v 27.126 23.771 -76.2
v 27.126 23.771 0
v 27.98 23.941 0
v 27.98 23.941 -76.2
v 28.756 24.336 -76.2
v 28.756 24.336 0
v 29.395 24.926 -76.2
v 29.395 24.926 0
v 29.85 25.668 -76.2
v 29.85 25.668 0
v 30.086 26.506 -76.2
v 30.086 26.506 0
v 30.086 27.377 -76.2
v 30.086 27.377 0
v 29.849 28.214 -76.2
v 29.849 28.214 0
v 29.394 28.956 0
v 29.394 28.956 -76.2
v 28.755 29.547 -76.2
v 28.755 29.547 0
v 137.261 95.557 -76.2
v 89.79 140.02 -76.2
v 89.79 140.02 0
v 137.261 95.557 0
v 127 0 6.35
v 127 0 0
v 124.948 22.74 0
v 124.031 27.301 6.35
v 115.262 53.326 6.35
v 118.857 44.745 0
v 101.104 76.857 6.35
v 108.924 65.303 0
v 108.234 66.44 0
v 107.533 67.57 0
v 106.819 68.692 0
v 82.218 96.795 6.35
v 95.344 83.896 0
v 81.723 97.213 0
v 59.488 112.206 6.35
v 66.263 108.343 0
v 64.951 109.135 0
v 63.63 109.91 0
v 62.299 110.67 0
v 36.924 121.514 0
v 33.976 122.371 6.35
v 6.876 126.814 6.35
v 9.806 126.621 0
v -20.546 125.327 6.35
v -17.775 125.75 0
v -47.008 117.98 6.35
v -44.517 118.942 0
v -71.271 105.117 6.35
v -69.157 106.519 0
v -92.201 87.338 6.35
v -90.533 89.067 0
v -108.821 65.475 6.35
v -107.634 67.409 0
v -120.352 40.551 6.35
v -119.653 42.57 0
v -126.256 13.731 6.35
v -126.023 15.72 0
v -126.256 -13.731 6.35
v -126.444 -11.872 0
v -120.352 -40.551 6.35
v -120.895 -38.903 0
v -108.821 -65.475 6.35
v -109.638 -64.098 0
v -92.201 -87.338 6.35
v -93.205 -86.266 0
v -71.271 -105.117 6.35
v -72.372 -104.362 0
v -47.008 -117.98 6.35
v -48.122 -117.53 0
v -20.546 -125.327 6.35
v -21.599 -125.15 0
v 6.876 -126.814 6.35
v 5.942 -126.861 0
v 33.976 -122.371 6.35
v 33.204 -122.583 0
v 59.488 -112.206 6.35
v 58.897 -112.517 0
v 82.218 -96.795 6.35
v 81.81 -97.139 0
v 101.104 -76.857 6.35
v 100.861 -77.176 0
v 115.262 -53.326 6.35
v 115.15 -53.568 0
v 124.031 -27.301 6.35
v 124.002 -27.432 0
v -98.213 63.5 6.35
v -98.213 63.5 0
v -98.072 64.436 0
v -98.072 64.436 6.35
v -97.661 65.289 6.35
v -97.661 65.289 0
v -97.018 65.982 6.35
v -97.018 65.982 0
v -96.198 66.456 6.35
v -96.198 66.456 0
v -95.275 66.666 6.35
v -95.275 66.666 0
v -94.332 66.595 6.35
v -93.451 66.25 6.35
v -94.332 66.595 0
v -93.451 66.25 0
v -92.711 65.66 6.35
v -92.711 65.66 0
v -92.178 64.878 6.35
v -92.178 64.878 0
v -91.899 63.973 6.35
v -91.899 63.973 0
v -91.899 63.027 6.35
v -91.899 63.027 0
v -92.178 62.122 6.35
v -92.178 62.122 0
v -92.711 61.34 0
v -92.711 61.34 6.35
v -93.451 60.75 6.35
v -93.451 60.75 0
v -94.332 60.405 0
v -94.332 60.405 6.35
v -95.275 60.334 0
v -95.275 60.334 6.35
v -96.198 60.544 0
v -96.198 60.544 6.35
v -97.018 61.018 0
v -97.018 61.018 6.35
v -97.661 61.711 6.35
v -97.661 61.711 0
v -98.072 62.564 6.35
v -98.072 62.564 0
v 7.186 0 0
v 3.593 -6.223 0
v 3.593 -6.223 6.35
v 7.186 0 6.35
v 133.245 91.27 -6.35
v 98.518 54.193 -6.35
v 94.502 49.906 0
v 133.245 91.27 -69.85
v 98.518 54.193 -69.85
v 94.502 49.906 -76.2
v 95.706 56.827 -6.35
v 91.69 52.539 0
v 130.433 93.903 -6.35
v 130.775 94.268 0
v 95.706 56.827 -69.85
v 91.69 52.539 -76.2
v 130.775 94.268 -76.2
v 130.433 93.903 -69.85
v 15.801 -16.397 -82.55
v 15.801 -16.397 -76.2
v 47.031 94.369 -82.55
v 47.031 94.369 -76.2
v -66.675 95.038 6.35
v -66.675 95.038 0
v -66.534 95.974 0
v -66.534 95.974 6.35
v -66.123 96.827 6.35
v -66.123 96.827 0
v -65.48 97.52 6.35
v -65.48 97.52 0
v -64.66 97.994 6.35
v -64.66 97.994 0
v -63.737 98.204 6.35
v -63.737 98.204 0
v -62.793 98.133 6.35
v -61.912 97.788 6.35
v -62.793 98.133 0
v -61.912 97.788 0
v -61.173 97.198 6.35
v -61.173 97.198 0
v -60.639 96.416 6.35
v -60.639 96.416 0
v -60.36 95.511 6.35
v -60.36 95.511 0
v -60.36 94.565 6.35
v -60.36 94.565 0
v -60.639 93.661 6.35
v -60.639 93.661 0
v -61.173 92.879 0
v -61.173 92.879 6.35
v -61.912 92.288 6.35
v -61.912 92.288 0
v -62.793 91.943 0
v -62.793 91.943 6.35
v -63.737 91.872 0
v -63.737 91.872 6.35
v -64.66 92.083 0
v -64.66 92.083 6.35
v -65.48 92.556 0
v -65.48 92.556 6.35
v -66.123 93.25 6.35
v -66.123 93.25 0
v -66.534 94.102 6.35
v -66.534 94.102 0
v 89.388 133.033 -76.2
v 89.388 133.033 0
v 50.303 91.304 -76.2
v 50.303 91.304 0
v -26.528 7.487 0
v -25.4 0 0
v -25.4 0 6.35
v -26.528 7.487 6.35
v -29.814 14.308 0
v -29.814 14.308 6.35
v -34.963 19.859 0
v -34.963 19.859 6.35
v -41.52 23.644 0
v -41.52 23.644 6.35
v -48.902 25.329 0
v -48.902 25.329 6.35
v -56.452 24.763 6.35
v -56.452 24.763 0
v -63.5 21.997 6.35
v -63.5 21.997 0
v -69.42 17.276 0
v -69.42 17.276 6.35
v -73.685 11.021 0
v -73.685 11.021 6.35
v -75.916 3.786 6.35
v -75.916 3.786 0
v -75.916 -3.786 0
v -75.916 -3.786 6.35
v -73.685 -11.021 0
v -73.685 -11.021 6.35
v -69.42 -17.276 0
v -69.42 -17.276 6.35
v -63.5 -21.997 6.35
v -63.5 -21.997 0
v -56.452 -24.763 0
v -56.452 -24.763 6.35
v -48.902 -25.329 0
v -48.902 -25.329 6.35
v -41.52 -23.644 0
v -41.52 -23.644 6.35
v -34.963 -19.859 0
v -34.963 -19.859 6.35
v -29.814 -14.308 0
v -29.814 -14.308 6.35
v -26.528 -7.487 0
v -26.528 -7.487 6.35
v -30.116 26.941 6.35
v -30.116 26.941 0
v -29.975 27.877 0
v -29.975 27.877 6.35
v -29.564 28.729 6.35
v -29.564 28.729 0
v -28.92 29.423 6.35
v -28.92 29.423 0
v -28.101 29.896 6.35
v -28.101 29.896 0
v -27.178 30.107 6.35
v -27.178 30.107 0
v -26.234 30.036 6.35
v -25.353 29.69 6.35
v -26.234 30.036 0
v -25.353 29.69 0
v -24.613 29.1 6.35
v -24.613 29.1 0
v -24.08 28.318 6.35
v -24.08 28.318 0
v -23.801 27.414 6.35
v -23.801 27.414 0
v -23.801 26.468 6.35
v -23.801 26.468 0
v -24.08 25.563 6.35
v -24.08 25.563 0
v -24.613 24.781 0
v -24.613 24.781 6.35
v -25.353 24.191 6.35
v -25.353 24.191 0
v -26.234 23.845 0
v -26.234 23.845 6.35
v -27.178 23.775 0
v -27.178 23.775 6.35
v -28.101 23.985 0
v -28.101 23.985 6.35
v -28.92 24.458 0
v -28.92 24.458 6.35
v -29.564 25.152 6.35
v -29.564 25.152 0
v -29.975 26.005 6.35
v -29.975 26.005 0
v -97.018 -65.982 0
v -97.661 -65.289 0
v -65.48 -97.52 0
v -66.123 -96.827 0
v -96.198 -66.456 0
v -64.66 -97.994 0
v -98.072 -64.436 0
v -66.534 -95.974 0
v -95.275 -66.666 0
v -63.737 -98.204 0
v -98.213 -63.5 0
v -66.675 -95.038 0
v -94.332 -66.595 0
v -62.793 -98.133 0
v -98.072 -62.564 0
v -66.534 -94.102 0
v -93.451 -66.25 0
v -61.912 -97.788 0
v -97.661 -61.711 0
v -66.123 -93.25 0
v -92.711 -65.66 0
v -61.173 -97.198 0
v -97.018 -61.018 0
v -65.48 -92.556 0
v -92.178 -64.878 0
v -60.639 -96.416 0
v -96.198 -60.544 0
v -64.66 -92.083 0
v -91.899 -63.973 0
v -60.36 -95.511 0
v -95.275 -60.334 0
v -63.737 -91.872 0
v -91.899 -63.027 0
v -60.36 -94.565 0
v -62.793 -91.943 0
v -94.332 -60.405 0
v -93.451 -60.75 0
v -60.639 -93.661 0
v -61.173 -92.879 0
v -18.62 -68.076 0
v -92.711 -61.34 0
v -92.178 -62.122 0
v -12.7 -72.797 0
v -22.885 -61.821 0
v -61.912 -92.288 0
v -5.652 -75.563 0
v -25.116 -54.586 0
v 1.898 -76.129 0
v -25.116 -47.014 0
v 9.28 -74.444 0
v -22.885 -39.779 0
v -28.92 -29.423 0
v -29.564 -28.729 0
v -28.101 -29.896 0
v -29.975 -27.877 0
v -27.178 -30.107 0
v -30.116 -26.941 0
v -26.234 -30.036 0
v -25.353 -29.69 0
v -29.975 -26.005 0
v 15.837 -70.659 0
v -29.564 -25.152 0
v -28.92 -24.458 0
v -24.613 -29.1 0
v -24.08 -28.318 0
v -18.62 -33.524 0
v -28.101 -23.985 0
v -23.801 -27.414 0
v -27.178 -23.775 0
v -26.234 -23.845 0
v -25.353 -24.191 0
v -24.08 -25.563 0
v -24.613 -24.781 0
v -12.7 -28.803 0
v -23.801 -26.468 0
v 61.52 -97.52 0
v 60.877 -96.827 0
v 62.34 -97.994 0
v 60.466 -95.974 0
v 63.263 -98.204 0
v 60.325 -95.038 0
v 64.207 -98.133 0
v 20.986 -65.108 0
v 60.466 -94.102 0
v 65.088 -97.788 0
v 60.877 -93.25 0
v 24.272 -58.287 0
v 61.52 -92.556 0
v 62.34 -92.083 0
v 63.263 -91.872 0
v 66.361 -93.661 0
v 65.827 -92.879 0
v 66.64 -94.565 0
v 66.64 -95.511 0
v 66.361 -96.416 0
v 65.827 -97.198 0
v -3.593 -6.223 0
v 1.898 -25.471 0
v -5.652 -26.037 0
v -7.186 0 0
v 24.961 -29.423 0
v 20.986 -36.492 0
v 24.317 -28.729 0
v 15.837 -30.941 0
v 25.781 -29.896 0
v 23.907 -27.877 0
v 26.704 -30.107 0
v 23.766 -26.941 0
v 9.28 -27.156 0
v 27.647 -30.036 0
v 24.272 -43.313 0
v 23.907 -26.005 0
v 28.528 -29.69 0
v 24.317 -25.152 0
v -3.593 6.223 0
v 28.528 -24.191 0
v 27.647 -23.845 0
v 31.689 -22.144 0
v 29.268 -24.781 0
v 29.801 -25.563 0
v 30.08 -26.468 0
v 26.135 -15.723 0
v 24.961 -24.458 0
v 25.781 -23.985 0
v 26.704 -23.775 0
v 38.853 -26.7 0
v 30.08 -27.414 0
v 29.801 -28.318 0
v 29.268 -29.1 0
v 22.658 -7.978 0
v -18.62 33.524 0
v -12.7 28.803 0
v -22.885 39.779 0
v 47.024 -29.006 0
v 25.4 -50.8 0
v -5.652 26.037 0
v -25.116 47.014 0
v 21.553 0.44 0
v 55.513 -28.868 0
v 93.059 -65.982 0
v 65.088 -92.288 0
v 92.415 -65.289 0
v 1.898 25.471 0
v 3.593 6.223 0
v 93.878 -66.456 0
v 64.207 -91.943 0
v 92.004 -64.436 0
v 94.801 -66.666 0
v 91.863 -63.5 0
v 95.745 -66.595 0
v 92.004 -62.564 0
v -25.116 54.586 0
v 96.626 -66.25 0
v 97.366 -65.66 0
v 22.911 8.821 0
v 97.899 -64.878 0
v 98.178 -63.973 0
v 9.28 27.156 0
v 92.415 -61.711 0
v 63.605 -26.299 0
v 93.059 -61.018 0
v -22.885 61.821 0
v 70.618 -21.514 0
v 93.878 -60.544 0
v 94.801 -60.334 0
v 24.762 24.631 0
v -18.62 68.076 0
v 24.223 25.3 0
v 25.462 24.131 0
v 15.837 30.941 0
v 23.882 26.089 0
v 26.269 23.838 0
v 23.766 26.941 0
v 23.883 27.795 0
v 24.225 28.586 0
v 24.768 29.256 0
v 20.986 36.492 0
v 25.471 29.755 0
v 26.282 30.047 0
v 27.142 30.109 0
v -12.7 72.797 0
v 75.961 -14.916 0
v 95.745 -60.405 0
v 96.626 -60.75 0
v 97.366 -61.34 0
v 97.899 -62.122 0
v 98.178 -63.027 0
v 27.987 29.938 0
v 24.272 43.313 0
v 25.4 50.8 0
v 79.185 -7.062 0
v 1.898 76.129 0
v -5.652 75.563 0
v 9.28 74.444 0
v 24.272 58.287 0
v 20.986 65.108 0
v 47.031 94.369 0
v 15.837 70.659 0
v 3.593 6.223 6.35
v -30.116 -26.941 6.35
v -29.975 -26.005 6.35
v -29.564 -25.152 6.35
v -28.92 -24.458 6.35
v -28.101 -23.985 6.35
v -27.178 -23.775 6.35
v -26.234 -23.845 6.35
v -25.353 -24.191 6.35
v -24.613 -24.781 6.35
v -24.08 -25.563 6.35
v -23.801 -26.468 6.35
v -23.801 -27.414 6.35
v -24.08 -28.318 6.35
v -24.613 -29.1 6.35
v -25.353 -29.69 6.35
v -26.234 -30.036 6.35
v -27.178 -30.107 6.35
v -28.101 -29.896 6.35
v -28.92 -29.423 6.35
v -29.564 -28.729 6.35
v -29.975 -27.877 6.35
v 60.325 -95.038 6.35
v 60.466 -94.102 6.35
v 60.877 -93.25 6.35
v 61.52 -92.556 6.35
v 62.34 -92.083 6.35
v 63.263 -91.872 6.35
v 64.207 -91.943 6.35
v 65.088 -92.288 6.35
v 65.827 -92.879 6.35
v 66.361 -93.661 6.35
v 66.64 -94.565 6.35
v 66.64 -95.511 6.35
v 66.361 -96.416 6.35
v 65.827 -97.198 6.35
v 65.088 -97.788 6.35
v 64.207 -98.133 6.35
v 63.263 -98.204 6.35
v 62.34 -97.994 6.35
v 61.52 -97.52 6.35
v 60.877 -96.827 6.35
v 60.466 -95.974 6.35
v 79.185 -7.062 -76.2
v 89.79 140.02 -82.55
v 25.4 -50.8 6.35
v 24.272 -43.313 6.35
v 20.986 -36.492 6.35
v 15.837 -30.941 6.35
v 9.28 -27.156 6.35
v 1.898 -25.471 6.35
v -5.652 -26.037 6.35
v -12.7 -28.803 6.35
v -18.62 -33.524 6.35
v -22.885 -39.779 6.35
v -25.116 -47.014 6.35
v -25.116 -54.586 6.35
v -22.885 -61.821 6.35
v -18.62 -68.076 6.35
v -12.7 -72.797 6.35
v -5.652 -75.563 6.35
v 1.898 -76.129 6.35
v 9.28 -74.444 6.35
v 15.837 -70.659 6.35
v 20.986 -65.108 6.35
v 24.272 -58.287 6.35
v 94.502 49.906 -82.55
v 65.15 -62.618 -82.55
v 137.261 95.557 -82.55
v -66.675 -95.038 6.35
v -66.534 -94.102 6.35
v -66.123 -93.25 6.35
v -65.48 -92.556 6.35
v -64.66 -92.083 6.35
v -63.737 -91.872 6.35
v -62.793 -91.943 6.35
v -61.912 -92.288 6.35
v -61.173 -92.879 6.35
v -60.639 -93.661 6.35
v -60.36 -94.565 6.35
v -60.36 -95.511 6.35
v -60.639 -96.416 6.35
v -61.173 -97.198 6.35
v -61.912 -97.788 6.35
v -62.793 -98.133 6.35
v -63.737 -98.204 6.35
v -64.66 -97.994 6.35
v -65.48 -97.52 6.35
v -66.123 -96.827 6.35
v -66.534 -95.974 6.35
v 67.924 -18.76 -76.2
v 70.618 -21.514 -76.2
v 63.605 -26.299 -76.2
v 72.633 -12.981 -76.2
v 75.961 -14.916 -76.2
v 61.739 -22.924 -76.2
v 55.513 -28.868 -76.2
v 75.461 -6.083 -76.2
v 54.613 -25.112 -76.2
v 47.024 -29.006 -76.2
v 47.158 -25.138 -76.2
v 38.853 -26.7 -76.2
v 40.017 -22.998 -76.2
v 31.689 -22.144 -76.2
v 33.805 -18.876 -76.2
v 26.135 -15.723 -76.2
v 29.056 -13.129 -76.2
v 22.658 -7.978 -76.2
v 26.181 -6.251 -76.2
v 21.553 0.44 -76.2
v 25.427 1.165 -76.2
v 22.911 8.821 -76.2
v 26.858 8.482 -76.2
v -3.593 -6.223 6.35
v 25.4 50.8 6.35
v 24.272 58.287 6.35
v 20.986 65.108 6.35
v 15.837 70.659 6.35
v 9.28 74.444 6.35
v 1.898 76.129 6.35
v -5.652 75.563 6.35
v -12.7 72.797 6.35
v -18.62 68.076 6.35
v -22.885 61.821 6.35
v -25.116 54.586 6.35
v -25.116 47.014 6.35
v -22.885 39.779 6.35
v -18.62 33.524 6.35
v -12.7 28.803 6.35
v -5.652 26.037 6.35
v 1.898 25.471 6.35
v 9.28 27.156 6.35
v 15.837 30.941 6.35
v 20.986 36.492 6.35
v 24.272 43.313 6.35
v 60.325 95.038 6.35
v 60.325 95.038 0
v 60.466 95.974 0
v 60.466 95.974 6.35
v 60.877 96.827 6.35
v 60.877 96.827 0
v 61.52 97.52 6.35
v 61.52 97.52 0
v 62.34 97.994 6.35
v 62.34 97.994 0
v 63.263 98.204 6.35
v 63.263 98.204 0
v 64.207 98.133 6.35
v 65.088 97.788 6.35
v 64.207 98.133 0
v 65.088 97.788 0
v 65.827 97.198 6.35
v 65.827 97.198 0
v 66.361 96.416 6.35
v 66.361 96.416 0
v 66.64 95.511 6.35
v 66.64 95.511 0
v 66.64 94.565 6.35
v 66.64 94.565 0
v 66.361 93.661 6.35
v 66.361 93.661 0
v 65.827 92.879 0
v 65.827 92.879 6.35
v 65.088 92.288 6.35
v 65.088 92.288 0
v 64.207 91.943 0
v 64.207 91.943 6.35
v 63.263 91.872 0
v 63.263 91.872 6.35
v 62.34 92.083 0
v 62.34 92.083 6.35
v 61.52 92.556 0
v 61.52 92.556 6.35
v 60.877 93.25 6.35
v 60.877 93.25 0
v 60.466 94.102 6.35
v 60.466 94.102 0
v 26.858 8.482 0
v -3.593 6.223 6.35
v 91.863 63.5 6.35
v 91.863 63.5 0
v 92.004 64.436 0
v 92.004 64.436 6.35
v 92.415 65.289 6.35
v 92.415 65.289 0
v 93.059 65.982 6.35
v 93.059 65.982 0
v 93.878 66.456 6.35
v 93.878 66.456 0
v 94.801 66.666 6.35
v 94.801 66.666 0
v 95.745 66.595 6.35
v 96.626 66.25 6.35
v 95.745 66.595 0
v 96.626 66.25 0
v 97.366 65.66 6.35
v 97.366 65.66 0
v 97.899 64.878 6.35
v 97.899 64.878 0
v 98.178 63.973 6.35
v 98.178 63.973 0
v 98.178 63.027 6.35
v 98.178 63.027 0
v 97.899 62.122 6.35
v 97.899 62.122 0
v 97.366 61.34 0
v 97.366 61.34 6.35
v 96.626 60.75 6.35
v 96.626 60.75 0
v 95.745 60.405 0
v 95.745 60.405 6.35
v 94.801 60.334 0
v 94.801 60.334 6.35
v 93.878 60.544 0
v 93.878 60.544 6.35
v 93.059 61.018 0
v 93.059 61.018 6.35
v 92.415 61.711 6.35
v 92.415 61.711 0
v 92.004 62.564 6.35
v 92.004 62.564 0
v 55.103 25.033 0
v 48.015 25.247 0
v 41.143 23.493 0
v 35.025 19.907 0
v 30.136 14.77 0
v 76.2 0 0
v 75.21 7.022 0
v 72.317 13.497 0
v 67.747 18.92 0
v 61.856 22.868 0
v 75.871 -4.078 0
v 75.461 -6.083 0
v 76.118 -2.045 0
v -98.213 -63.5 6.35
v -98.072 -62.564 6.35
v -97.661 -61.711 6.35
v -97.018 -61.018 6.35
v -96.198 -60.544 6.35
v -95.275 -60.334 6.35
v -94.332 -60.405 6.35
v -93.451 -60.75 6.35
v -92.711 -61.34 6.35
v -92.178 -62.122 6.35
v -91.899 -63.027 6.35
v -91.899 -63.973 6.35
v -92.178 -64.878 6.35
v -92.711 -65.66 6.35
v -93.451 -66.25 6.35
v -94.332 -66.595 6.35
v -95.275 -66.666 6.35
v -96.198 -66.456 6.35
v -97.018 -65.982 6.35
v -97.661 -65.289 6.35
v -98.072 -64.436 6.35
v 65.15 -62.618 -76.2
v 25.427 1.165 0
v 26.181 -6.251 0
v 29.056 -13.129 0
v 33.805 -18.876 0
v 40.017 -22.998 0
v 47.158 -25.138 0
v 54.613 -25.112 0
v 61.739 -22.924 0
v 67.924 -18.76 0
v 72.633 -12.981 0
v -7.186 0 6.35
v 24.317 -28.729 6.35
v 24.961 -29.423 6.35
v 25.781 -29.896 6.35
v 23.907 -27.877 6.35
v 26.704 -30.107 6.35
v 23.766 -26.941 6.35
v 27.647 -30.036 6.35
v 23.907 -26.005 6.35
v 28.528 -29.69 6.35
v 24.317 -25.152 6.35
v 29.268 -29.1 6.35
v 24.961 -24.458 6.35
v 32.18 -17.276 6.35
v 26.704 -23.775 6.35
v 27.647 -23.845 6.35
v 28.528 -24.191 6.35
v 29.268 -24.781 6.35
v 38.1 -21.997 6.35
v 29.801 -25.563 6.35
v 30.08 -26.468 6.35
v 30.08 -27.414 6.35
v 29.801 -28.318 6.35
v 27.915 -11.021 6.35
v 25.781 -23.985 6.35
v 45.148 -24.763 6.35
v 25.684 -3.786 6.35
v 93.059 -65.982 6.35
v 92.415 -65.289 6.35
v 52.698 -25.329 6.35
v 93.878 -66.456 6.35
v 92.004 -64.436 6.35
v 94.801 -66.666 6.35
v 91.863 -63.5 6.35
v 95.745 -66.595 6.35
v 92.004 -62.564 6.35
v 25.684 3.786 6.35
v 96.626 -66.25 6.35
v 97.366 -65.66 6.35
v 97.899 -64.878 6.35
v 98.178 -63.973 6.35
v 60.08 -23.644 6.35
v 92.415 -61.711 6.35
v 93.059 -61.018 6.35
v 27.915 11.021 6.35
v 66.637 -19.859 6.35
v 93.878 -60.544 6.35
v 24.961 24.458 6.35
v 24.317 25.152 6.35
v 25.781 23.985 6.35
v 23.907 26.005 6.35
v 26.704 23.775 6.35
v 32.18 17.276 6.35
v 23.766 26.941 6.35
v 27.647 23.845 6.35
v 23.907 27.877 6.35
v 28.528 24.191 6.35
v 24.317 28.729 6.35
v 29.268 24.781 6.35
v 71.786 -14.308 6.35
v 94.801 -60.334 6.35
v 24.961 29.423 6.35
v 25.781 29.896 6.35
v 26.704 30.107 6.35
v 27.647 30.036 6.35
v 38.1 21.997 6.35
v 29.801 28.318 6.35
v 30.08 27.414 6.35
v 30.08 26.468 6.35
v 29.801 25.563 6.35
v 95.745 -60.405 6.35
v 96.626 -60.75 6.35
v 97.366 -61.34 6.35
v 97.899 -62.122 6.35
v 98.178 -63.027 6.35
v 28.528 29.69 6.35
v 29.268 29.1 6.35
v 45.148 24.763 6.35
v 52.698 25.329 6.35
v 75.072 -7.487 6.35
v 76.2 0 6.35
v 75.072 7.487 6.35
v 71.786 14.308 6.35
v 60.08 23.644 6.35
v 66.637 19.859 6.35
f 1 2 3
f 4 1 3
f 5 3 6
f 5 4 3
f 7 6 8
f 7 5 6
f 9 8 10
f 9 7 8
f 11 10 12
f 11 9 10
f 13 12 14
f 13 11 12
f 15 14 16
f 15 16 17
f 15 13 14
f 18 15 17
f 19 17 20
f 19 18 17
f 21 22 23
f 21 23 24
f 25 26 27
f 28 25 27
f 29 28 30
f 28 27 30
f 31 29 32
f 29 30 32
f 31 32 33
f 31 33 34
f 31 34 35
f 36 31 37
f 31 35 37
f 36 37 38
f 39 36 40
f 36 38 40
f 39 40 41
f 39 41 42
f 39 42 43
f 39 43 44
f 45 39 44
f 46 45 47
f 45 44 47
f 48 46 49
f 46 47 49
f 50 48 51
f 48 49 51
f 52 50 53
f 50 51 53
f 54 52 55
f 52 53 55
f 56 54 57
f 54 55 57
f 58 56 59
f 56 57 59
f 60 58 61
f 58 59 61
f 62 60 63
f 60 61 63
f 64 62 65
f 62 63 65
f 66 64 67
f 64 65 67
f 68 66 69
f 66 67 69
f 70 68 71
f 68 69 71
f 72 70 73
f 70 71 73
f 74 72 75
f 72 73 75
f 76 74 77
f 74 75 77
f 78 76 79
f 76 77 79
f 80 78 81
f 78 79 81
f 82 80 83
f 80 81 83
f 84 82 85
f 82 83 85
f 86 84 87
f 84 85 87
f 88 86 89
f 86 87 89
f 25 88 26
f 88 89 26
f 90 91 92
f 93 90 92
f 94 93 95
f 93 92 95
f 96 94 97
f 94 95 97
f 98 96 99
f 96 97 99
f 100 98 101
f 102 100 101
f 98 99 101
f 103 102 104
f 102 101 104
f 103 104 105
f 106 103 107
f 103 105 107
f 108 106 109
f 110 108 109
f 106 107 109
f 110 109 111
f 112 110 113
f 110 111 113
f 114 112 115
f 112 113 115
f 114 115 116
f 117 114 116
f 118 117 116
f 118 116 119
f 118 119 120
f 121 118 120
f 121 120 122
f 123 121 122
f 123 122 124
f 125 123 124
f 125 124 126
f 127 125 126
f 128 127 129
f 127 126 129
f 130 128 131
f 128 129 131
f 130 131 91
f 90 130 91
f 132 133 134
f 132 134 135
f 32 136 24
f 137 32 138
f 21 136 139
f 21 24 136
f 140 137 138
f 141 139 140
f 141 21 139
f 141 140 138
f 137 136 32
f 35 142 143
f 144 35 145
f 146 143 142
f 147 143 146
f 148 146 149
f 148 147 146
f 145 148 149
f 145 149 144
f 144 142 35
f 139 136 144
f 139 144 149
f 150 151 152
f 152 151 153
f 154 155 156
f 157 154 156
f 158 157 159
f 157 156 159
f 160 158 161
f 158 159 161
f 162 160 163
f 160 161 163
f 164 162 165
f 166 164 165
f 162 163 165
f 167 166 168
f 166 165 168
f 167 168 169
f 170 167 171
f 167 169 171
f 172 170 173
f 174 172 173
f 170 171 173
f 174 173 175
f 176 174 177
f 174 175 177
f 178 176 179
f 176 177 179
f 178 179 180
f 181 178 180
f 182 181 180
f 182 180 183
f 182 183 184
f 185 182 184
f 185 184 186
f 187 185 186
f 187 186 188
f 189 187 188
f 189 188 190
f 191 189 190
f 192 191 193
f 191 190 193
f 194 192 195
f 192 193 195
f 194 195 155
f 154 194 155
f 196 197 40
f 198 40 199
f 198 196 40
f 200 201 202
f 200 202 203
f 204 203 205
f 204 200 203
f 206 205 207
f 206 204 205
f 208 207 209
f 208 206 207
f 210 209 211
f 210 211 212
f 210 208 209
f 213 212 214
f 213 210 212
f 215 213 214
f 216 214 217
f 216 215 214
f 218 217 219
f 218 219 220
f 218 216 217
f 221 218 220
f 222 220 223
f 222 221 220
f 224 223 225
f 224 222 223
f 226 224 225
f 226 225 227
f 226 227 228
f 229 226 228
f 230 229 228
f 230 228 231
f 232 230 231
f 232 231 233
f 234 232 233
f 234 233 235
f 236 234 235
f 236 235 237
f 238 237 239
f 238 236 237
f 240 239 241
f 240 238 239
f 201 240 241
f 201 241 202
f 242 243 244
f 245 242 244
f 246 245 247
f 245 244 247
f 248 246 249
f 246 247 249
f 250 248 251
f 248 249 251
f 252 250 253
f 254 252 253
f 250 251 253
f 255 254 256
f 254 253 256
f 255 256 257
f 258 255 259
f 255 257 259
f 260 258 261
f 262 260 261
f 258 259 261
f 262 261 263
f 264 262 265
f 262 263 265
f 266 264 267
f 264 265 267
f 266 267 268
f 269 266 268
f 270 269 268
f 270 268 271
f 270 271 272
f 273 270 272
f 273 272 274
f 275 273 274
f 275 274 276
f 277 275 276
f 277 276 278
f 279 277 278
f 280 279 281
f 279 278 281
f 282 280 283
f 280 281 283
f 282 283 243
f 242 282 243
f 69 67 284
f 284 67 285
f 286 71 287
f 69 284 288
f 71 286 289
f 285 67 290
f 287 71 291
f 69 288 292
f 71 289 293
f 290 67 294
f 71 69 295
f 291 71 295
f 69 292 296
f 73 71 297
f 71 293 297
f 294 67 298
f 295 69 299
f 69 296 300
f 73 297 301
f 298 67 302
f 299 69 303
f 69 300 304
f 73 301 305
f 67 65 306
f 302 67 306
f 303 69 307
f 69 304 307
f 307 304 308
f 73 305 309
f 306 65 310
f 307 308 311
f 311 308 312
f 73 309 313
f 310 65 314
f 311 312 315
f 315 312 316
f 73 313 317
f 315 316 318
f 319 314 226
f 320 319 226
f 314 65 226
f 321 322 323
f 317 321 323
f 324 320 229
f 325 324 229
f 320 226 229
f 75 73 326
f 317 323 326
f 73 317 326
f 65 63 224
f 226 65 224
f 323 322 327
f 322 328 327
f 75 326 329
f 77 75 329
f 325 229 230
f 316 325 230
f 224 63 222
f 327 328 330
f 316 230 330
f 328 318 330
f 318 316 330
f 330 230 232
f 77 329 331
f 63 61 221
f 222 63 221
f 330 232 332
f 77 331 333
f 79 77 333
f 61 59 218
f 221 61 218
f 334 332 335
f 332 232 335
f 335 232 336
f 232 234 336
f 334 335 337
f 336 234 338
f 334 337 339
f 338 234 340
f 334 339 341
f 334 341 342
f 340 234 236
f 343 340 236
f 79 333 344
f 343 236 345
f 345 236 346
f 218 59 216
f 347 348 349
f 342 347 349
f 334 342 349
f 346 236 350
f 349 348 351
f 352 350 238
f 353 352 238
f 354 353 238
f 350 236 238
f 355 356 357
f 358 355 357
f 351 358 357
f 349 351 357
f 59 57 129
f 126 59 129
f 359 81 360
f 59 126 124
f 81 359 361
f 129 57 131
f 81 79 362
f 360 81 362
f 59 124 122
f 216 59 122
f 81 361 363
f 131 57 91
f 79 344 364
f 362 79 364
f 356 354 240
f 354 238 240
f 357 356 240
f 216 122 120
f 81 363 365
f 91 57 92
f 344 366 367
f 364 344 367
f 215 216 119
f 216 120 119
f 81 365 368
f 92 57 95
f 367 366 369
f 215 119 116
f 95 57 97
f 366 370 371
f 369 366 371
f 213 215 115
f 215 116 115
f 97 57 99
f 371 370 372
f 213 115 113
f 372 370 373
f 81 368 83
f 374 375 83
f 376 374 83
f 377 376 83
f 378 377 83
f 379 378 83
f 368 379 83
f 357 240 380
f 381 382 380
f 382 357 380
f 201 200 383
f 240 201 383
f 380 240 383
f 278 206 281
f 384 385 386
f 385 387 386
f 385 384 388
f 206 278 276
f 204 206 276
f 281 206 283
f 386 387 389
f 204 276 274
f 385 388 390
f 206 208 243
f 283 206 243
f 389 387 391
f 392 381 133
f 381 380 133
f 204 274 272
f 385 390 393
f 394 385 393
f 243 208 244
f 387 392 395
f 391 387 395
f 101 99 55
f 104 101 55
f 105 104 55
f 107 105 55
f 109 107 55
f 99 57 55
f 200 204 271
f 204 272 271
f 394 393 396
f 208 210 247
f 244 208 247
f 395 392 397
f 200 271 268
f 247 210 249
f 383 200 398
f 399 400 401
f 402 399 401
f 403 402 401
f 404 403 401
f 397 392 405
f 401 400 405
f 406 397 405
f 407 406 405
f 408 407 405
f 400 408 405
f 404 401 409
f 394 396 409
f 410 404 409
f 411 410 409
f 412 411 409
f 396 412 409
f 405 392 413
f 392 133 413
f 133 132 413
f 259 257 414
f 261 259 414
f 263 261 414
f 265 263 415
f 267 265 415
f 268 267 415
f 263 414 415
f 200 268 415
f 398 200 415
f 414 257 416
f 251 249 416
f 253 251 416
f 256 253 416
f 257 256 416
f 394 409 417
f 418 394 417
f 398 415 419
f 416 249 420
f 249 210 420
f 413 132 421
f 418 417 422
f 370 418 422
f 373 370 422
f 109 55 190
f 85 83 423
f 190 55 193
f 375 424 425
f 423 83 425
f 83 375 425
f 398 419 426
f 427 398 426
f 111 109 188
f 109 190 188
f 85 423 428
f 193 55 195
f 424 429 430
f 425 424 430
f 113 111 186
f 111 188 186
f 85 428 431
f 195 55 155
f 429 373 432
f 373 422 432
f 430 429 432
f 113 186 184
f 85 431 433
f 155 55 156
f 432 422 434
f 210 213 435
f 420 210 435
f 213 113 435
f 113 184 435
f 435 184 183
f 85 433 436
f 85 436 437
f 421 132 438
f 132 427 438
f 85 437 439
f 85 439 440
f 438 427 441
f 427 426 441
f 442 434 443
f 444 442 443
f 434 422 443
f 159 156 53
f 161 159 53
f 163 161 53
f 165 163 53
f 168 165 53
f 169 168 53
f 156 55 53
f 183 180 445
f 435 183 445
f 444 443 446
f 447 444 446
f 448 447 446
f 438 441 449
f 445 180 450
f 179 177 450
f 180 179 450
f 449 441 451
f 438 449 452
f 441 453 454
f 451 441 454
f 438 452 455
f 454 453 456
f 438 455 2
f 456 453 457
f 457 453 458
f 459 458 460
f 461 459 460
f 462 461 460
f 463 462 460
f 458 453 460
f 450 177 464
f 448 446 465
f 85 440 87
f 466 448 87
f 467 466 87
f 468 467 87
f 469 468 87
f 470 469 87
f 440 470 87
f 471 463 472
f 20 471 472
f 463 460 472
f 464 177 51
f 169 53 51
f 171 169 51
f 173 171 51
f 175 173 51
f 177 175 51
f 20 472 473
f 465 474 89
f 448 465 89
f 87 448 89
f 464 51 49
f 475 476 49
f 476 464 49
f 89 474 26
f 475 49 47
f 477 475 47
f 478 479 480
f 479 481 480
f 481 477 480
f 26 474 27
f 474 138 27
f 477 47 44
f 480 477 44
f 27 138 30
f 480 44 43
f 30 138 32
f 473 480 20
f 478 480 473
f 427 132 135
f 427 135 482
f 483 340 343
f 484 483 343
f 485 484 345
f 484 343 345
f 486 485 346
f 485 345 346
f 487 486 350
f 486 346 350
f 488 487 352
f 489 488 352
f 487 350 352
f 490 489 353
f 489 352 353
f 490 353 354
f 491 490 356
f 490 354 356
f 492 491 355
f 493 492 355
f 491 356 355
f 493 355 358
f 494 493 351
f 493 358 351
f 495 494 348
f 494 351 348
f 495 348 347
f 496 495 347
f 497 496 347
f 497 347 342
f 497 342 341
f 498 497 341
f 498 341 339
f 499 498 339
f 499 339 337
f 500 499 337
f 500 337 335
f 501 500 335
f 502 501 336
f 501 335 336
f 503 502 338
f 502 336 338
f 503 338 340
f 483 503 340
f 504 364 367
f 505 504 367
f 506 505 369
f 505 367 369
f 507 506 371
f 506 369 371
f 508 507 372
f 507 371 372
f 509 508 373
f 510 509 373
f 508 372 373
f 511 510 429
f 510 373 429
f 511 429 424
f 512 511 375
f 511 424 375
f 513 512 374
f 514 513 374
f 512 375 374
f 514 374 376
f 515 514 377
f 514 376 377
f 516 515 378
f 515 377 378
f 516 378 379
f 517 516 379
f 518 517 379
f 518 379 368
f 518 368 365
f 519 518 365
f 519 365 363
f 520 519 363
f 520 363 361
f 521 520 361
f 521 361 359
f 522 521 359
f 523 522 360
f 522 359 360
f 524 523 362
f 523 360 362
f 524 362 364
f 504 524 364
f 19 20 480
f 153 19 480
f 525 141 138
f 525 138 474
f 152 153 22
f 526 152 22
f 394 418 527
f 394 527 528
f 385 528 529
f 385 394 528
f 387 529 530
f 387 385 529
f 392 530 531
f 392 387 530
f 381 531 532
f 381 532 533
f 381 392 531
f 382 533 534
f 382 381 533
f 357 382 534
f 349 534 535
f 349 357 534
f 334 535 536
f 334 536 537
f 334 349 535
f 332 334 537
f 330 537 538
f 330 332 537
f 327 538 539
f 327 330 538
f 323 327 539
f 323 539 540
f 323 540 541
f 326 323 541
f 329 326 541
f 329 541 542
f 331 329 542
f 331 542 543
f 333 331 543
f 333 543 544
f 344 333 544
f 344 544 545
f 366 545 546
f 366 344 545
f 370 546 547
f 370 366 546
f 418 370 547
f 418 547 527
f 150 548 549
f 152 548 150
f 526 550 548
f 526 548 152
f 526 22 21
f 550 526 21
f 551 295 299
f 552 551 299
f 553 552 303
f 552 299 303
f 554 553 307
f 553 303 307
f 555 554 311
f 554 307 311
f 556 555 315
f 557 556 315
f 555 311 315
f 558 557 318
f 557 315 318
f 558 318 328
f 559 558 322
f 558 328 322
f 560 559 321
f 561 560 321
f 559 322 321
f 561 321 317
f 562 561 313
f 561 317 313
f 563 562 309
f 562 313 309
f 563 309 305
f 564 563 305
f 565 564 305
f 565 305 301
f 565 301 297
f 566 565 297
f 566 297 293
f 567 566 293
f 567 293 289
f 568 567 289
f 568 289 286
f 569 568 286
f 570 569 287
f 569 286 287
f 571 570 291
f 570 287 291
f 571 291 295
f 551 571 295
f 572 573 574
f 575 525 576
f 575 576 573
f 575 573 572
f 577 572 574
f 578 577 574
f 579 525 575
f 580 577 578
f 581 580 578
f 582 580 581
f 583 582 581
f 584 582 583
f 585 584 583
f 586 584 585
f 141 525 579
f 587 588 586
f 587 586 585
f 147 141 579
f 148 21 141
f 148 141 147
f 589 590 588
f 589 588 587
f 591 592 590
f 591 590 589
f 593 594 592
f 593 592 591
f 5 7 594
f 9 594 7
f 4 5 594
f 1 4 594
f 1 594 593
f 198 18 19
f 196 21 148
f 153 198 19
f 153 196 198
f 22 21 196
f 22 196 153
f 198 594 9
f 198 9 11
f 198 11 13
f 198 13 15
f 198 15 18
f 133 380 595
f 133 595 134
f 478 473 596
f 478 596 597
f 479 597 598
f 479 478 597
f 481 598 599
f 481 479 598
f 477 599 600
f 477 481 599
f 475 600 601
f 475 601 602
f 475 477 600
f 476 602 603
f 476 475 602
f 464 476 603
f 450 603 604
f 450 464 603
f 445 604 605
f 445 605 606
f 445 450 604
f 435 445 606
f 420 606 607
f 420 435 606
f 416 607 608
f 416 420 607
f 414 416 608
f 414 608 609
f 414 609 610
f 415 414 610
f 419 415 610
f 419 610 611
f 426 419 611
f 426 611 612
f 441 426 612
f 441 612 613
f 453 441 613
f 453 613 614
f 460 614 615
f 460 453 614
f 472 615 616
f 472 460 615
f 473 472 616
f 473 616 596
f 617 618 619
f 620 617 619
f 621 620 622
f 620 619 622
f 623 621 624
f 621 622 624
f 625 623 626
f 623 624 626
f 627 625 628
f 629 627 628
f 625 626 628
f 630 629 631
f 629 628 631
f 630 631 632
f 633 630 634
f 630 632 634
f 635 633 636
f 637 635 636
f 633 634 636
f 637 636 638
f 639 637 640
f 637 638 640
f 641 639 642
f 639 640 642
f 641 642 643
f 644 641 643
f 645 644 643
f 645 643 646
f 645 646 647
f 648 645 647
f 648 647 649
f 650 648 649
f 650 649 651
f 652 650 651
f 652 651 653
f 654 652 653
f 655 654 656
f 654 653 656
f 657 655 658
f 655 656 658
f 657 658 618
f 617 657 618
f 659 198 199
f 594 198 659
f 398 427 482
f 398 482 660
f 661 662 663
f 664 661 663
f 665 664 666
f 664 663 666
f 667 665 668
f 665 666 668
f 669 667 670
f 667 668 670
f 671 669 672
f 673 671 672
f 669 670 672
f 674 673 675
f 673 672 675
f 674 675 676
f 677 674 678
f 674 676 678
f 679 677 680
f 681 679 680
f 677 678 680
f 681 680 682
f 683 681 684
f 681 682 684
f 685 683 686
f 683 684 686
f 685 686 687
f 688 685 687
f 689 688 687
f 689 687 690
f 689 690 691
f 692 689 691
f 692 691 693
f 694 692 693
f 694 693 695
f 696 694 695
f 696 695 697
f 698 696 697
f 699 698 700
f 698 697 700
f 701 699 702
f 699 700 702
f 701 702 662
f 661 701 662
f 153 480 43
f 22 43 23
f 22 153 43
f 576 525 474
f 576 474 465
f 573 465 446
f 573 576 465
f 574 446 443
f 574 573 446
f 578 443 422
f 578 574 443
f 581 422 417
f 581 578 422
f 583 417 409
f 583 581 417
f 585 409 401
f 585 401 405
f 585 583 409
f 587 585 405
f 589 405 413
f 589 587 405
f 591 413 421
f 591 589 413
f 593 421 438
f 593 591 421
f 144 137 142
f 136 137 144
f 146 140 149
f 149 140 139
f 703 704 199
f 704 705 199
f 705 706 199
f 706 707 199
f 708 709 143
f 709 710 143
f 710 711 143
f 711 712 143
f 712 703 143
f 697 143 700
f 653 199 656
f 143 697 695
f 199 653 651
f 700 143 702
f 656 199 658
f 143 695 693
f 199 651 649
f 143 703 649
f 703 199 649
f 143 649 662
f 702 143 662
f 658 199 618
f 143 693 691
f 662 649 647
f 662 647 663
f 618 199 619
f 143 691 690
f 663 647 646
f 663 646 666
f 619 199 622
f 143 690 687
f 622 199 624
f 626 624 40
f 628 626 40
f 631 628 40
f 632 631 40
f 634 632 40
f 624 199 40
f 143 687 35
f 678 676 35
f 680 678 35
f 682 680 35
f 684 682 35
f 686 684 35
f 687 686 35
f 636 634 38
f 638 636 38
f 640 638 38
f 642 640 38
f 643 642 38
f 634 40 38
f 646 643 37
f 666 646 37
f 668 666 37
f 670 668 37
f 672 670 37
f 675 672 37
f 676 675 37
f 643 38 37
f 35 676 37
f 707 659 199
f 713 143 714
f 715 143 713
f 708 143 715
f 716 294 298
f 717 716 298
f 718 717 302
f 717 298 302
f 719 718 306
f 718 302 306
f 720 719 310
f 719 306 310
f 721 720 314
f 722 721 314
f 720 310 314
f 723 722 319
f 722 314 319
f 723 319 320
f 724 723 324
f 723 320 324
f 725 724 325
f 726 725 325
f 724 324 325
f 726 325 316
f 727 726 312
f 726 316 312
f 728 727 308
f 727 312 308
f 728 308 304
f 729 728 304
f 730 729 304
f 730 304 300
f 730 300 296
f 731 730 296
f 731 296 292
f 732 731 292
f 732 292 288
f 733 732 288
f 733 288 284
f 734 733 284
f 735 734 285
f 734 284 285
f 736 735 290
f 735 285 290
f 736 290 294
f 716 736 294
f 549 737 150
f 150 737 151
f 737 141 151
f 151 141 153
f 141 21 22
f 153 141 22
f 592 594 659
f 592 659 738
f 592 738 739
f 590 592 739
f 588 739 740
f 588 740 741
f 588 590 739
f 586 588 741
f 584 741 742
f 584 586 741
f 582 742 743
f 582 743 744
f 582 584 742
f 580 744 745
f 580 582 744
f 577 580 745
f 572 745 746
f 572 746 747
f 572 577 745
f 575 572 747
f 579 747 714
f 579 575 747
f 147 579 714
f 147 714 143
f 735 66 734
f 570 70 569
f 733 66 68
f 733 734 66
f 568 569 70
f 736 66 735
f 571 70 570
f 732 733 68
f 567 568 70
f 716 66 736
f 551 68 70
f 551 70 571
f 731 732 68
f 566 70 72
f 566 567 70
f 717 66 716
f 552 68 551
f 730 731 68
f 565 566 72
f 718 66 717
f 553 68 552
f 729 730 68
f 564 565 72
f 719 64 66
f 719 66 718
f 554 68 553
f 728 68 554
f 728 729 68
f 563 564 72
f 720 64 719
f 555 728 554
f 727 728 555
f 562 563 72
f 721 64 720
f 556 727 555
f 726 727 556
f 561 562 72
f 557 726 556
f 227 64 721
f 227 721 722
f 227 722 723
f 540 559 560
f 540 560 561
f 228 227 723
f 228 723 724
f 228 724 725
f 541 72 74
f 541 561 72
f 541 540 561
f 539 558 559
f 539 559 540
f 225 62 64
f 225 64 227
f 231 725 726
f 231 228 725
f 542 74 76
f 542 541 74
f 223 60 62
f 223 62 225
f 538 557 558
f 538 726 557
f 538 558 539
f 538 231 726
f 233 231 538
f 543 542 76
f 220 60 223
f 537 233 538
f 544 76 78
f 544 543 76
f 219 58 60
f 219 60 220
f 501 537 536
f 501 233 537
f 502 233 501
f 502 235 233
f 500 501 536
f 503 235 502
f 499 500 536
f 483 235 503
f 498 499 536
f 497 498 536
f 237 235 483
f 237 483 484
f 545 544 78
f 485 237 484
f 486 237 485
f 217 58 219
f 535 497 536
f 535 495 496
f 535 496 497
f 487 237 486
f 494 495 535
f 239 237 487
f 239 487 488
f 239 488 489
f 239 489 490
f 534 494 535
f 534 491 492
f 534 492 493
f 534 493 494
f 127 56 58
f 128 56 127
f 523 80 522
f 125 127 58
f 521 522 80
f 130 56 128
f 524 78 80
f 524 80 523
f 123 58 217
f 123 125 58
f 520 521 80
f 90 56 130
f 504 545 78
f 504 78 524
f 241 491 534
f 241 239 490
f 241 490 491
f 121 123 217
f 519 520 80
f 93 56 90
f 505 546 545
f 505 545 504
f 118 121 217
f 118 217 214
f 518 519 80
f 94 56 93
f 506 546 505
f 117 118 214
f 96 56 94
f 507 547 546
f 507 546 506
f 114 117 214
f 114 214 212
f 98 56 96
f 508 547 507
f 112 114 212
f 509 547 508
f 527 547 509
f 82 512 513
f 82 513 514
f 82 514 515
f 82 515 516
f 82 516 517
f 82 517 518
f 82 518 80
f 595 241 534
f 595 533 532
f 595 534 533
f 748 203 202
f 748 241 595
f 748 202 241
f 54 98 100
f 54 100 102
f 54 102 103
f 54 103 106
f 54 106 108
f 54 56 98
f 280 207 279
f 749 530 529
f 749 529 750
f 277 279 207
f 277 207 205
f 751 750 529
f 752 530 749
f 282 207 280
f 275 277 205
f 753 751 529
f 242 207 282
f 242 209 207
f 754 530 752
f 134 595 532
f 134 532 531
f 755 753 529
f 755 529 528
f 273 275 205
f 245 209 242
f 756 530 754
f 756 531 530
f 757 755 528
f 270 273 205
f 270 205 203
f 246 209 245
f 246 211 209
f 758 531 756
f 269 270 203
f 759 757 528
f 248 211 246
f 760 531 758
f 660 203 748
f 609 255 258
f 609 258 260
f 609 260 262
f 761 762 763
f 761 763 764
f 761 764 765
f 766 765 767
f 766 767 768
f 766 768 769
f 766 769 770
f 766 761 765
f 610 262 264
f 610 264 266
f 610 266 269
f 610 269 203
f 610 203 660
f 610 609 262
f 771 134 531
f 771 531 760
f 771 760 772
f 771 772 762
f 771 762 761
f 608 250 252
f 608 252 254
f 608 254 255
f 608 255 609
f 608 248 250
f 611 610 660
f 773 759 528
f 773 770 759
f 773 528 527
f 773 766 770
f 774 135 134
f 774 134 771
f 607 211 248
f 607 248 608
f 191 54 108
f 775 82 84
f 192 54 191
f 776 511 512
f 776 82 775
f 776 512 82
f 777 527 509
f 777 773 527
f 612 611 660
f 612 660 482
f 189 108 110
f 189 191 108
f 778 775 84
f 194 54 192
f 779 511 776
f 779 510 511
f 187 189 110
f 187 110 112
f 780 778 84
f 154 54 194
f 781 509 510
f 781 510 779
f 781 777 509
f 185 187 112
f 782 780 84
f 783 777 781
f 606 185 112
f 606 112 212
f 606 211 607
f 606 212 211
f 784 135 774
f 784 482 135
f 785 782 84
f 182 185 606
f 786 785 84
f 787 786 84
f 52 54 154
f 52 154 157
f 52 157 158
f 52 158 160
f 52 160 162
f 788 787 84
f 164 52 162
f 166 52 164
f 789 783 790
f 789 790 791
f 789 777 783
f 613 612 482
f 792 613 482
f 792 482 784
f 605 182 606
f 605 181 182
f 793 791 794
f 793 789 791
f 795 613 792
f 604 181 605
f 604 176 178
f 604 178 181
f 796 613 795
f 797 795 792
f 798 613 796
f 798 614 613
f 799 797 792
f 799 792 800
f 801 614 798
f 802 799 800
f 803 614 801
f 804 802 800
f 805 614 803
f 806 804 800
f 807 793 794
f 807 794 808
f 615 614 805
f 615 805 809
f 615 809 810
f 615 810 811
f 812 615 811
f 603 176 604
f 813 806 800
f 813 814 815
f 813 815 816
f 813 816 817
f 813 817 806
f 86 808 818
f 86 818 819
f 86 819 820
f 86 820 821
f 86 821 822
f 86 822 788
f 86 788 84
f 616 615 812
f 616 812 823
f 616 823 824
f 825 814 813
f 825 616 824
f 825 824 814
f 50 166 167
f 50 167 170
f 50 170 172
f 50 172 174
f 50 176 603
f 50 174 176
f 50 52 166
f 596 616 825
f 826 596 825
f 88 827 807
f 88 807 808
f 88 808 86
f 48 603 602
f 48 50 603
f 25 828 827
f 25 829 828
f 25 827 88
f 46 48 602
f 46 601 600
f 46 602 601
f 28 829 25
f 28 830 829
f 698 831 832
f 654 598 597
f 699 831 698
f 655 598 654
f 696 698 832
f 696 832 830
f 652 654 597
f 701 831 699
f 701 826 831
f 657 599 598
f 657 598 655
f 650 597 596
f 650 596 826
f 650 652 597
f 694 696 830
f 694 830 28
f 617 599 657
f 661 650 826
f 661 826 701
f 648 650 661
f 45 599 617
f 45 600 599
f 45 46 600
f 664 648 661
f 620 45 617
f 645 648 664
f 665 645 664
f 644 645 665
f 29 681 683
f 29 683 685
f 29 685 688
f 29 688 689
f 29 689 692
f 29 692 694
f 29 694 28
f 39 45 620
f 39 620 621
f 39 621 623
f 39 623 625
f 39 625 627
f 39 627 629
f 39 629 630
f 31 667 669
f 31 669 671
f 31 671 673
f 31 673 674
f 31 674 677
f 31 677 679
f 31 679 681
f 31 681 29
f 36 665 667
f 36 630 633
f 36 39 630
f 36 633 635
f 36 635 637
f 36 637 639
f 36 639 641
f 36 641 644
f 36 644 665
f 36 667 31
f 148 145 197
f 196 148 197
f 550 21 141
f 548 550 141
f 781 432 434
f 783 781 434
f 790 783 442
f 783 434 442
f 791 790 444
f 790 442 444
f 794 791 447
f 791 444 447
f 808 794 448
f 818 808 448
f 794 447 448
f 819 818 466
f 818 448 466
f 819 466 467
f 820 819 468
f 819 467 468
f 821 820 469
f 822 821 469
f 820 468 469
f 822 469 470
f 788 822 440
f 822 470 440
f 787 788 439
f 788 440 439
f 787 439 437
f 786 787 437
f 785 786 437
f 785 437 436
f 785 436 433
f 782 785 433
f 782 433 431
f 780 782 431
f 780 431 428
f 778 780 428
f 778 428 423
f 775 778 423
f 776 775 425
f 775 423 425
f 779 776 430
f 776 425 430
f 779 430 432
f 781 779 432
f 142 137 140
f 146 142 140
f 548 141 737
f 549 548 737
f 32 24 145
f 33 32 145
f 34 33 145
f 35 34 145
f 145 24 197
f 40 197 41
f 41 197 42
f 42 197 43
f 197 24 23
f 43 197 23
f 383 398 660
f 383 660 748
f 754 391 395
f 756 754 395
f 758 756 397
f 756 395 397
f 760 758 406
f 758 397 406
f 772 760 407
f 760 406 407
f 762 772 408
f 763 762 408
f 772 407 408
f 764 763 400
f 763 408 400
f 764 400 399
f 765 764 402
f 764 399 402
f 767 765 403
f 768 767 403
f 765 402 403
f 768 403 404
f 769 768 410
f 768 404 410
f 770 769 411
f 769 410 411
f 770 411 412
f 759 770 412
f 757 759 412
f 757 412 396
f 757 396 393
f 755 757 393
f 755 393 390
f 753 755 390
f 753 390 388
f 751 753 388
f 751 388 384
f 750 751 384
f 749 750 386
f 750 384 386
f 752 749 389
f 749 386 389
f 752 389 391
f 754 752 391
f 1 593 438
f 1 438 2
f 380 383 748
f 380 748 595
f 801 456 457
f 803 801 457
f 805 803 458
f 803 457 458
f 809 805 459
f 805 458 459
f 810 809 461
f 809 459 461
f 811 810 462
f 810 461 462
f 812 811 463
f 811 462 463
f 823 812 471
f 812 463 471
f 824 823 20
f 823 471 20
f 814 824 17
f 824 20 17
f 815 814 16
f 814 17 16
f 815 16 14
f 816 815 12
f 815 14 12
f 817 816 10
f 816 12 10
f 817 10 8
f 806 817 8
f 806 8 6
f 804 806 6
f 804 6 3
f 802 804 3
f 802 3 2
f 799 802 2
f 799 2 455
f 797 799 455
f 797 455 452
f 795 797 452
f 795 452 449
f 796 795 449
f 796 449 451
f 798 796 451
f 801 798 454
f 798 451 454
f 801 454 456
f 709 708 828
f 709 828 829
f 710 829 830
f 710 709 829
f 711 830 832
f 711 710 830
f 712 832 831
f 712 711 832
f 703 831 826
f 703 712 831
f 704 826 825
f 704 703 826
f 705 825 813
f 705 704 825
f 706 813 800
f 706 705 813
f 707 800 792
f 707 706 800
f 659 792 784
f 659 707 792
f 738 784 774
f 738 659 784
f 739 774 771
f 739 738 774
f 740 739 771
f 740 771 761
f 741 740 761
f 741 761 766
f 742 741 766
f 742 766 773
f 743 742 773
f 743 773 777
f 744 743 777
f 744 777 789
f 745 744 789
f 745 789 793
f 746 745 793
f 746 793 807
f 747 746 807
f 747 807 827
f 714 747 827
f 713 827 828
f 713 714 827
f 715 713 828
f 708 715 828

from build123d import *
from build123d.topology import SkipClean

# Parameters (mm, degrees)
SKETCH1_R           = 127
SKETCH1_R_2         = 25.4
BOSS_EXTRUDE1_DEPTH = 6.35
SKETCH3_R           = 3.175
CUT_EXTRUDE1_DEPTH  = 6.35
BOSS_EXTRUDE3_START = 76.2
BOSS_EXTRUDE3_DEPTH = 76.2
SKETCH8_W           = 63.5
SKETCH8_H           = 50.8
CUT_EXTRUDE2_DEPTH  = 6.35
BOSS_EXTRUDE4_DEPTH = 6.35


with BuildPart() as part:
    # Sketch1 → Boss-Extrude1 (new body)
    with BuildSketch(Plane.XY):
        Circle(SKETCH1_R)
        with Locations((0, 50.8)):
            Circle(SKETCH1_R_2, mode=Mode.SUBTRACT)
        with Locations((50.8, 0)):
            Circle(SKETCH1_R_2, mode=Mode.SUBTRACT)
        with Locations((0, -50.8)):
            Circle(SKETCH1_R_2, mode=Mode.SUBTRACT)
        with Locations((-50.8, 0)):
            Circle(SKETCH1_R_2, mode=Mode.SUBTRACT)
        Polygon((7.18570145, 0), (3.592850725, 6.223), (-3.592850725, 6.223), (-7.18570145, 0), (-3.592850725, -6.223), (3.592850725, -6.223), align=None, mode=Mode.SUBTRACT)
    extrude(amount=BOSS_EXTRUDE1_DEPTH)

    # Sketch3 → Cut-Extrude1 (cut)
    with BuildSketch(Plane(origin=(0, 0, 0), x_dir=(-1, 0, 0), z_dir=(0, 0, -1))):
        with Locations((-26.940768363, 26.940768363)):
            Circle(SKETCH3_R)
        with Locations((26.940768363, 26.940768363)):
            Circle(SKETCH3_R)
        with Locations((26.940768363, -26.940768363)):
            Circle(SKETCH3_R)
        with Locations((-26.940768363, -26.940768363)):
            Circle(SKETCH3_R)
        with Locations((-63.5, 95.038097624)):
            Circle(SKETCH3_R)
        with Locations((63.5, 95.038097624)):
            Circle(SKETCH3_R)
        with Locations((95.038097624, 63.5)):
            Circle(SKETCH3_R)
        with Locations((95.038097624, -63.5)):
            Circle(SKETCH3_R)
        with Locations((63.5, -95.038097624)):
            Circle(SKETCH3_R)
        with Locations((-63.5, -95.038097624)):
            Circle(SKETCH3_R)
        with Locations((-95.038097624, -63.5)):
            Circle(SKETCH3_R)
        with Locations((-95.038097624, 63.5)):
            Circle(SKETCH3_R)
    extrude(amount=-CUT_EXTRUDE1_DEPTH, mode=Mode.SUBTRACT)

    # Sketch4 → Boss-Extrude3 (add)
    with SkipClean():  # the faces are left unmerged after this step: merging them gives an invalid solid
        with BuildSketch(Plane(origin=(0, 0, 0), x_dir=(-1, 0, 0), z_dir=(0, 0, -1)).offset(BOSS_EXTRUDE3_START)):
            with BuildLine():
                ThreePointArc((-79.185130885, -7.062226276), (-42.854710858, -28.150720697), (-22.911154448, 8.82060027))
                Line((-22.911154448, 8.82060027), (-27.126431814, 23.771201503))
                ThreePointArc((-27.126431814, 23.771201503), (-29.996629318, 26.079177494), (-28.75477002, 29.546535619))
                Line((-28.75477002, 29.546535619), (-47.031154579, 94.368589733))
                Line((-47.031154579, 94.368589733), (-89.78967593, 140.019925662))
                Line((-89.78967593, 140.019925662), (-137.260674726, 95.557049073))
                Line((-137.260674726, 95.557049073), (-94.502153375, 49.905713144))
                Line((-94.502153375, 49.905713144), (-79.185130885, -7.062226276))
            make_face()
            with BuildLine():
                Line((-91.690310224, 52.539376605), (-130.775049183, 94.268381527))
                Line((-130.775049183, 94.268381527), (-89.388084982, 133.032754057))
                Line((-89.388084982, 133.032754057), (-50.303346023, 91.303749135))
                Line((-50.303346023, 91.303749135), (-26.857967073, 8.48168965))
                ThreePointArc((-26.857967073, 8.48168965), (-43.508670742, -24.330978559), (-75.460781141, -6.083245311))
                Line((-75.460781141, -6.083245311), (-91.690310224, 52.539376605))
            make_face(mode=Mode.SUBTRACT)
        extrude(amount=-BOSS_EXTRUDE3_DEPTH)

    # Sketch8 → Cut-Extrude2 (cut)
    with SkipClean():  # the faces are left unmerged after this step: merging them gives an invalid solid
        with BuildSketch(Plane(origin=(25.440444099, -23.82834478, 0), x_dir=(0, 0, -1), z_dir=(0.729853070223302, -0.683604049055899, 0))):
            with Locations((38.1, 132.300225659)):
                Rectangle(SKETCH8_W, SKETCH8_H)
        extrude(amount=-CUT_EXTRUDE2_DEPTH, mode=Mode.SUBTRACT)


with BuildPart() as body_2:
    # Sketch6 → Boss-Extrude4 (new body)
    with BuildSketch(Plane(origin=(0, 0, -76.2), x_dir=(-1, 0, 0), z_dir=(0, 0, -1))):
        Polygon((-15.801225201, -16.396653006), (-47.031154579, 94.368589733), (-89.78967593, 140.019925662), (-137.260674726, 95.557049073), (-94.502153375, 49.905713144), (-65.150179146, -62.618483276), align=None)
    extrude(amount=BOSS_EXTRUDE4_DEPTH)


solid = Compound([part.part, body_2.part])
